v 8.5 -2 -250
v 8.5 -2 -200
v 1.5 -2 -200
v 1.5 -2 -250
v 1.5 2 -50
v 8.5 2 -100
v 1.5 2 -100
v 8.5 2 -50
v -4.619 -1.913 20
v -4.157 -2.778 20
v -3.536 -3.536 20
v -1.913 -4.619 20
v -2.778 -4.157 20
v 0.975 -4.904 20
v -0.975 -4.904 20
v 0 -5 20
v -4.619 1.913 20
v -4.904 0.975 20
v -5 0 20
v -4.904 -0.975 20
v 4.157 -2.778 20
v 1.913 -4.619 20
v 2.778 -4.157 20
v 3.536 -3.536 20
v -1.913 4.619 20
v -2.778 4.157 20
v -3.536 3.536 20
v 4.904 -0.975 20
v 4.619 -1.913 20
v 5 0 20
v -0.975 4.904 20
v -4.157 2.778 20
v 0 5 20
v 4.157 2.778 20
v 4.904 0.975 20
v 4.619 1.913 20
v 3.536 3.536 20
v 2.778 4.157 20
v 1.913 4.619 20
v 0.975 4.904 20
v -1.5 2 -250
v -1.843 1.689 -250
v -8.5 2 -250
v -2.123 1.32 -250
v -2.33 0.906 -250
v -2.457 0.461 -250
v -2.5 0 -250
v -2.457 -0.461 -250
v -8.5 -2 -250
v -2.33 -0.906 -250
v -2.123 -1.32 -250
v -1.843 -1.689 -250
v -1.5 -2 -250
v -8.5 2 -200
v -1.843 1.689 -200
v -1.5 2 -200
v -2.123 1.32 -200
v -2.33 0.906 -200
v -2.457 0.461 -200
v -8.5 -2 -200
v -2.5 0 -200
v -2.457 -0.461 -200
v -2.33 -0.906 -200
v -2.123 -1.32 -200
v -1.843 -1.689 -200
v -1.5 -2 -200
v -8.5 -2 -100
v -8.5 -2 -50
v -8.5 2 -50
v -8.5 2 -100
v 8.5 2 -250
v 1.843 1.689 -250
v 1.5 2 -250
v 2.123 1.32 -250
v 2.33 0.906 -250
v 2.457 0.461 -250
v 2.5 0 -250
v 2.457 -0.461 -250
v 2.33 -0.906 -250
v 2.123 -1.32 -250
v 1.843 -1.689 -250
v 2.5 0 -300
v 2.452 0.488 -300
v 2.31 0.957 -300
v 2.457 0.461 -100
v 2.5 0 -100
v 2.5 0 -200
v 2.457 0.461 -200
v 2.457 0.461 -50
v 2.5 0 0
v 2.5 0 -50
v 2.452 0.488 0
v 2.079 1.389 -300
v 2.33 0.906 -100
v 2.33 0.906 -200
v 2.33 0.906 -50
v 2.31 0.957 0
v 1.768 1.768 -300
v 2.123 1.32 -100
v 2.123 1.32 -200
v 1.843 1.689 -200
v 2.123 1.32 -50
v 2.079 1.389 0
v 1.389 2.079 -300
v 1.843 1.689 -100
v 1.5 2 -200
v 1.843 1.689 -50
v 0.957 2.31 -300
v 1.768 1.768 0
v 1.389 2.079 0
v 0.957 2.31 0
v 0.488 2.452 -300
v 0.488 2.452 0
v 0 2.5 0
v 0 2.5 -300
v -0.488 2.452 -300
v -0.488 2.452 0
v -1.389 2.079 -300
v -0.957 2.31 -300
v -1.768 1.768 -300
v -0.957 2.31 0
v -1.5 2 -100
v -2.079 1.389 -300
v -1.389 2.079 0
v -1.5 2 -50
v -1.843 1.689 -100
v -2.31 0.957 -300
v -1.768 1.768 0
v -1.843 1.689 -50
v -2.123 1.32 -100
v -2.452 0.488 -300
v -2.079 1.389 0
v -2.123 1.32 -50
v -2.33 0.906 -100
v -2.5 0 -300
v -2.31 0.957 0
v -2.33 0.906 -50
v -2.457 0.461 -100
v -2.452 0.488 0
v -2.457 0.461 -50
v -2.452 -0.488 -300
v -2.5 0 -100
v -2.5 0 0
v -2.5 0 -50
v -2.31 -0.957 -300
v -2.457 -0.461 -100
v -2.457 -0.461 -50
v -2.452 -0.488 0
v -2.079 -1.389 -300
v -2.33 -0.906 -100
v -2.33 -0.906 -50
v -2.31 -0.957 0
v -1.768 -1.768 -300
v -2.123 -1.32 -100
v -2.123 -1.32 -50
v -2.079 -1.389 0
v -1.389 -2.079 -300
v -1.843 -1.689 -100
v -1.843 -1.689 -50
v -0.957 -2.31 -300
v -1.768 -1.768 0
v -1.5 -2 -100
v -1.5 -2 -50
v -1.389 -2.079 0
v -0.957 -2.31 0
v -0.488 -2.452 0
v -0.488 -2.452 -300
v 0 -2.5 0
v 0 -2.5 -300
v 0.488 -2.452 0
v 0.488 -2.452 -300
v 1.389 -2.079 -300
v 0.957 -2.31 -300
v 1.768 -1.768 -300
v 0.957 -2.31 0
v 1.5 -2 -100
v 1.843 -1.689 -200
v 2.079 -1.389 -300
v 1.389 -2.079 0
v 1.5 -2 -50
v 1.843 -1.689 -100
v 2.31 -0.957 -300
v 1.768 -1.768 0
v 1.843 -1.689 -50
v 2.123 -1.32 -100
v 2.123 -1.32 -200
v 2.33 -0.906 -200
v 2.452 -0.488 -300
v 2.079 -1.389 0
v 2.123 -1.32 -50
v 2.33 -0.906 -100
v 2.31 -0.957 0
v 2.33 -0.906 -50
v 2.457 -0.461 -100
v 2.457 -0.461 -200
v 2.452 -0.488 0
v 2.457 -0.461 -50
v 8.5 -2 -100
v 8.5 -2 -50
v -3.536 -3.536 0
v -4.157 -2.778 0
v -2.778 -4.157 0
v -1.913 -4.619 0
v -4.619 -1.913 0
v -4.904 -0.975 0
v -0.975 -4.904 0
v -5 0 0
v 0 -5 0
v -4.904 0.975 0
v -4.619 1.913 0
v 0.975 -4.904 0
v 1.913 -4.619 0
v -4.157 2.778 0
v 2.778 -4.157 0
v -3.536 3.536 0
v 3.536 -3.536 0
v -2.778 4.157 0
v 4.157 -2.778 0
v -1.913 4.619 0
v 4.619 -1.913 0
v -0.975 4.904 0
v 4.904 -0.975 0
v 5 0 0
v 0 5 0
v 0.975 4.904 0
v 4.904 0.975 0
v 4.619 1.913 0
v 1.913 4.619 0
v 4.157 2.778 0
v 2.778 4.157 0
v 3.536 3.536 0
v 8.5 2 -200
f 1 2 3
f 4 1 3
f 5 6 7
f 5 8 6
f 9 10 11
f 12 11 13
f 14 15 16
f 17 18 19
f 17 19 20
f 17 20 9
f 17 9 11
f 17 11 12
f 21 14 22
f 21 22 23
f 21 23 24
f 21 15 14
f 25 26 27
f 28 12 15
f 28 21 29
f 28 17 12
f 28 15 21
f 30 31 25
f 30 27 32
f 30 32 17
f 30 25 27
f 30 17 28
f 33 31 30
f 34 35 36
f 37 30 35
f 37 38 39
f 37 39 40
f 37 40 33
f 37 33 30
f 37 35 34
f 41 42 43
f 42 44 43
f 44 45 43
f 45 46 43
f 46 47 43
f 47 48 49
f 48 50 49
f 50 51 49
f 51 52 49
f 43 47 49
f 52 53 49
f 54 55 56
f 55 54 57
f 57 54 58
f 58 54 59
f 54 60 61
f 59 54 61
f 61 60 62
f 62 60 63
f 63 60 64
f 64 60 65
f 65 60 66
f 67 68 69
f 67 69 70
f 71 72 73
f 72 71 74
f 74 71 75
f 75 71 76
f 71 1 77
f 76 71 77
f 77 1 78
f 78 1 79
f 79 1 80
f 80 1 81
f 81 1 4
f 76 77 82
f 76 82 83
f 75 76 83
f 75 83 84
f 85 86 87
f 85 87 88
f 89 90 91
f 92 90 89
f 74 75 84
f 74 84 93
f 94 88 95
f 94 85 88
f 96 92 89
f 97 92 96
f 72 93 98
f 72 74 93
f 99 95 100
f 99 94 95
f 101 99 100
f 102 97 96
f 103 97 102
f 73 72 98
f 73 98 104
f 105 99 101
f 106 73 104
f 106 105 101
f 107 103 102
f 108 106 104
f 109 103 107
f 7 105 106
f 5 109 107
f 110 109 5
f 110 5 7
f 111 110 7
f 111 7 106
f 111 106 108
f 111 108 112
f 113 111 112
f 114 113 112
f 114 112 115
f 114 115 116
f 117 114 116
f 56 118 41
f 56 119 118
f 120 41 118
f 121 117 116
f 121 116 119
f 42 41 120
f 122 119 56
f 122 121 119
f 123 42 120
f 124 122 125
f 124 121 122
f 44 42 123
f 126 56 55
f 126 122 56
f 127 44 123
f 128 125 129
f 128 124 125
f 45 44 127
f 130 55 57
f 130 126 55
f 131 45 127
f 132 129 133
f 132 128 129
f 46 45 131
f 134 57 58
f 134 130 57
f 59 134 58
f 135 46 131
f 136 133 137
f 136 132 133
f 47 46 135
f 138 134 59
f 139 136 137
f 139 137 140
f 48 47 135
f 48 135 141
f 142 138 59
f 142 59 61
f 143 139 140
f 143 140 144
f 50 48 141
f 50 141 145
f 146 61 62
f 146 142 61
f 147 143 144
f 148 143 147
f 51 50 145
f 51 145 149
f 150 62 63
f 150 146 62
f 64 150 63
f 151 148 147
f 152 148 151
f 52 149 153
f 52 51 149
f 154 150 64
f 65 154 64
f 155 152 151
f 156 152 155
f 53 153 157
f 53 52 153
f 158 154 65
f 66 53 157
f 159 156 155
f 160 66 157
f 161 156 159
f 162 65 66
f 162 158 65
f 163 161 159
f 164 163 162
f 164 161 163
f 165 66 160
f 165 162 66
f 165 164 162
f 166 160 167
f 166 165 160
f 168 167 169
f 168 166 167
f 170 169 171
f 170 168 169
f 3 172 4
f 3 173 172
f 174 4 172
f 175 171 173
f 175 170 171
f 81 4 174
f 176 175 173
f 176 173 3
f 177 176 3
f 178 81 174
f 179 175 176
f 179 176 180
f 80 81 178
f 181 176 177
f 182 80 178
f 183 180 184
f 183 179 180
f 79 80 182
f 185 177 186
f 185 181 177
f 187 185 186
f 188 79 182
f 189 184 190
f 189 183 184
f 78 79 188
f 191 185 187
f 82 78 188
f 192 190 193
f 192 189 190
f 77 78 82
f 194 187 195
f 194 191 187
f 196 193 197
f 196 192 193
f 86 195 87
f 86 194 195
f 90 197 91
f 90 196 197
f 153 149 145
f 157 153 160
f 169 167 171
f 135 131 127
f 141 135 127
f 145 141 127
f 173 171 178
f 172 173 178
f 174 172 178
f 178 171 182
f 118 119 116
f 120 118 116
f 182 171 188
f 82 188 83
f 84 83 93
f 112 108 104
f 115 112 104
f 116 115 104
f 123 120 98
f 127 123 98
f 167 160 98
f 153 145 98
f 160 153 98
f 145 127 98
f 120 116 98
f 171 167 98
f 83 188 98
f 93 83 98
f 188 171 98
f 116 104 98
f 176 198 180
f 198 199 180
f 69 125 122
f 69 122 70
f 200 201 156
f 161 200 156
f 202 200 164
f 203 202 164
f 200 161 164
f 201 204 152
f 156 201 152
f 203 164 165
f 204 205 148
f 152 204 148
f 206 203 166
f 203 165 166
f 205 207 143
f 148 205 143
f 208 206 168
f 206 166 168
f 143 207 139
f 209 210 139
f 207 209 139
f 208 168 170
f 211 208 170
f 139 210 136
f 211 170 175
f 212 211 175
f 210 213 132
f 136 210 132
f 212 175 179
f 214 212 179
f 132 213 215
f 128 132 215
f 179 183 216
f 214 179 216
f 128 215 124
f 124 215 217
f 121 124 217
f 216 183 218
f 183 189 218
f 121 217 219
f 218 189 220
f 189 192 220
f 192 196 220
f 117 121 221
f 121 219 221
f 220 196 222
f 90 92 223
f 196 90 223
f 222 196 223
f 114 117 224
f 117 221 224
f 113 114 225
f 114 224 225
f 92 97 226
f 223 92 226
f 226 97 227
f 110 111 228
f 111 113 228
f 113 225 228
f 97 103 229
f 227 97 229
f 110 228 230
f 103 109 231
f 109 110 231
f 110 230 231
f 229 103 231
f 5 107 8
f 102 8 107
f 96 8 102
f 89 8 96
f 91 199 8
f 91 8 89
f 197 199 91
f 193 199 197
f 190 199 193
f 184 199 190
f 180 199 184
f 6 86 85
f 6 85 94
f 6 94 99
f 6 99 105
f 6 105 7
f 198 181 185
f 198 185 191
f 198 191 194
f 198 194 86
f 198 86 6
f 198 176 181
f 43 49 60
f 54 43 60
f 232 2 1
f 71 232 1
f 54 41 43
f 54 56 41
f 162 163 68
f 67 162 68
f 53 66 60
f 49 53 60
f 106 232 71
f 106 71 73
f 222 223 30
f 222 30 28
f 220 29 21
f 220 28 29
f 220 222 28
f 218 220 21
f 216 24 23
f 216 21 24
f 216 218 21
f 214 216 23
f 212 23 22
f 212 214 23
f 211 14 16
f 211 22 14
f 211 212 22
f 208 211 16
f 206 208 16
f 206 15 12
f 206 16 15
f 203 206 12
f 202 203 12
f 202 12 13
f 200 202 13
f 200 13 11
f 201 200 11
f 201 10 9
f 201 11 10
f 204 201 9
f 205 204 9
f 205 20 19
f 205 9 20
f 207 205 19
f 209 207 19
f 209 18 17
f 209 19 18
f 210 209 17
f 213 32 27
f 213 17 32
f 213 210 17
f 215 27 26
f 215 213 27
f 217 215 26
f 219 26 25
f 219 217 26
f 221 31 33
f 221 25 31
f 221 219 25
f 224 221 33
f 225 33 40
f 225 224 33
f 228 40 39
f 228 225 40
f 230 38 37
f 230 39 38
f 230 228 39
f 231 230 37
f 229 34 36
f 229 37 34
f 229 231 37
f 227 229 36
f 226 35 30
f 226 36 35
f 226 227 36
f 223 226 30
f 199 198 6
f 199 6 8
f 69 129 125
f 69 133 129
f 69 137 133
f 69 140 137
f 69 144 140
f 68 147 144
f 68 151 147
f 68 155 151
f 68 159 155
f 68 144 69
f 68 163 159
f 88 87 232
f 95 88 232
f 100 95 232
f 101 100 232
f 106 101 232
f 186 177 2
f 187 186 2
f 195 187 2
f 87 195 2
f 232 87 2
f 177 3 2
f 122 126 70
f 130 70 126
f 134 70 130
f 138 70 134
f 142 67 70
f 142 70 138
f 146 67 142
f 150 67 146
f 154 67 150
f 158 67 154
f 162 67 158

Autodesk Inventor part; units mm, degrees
ref_plane "YZ Plane" through (0, 0, 0) normal (1, 0, 0) x (0, 1, 0)
ref_plane "XZ Plane" through (0, 0, 0) normal (0, 1, 0) x (-1, 0, 0)
ref_plane "XY Plane" through (0, 0, 0) normal (0, 0, 1) x (1, 0, 0)
sketch "Sketch1" plane through (0, 0, 0) normal (0, 0, 1) x (1, 0, 0)
  circle A0 centre (0, 0) radius 2.5
  dimension "d0" = 5
extrude "Extrusion1" add sketch "Sketch1" against normal blind 300
sketch "Sketch2" plane through (0, 0, 0) normal (0, 1, 0) x (-1, 0, 0)
  line L0 (1.5, -50) -> (8.5, -50)
  line L1 (8.5, -50) -> (8.5, -100)
  line L2 (8.5, -100) -> (1.5, -100)
  line L3 (1.5, -100) -> (1.5, -50)
  line L4 (1.5, -250) -> (8.5, -250)
  line L5 (8.5, -250) -> (8.5, -200)
  line L6 (8.5, -200) -> (1.5, -200)
  line L7 (1.5, -200) -> (1.5, -250)
  point P0 (0, 0)
  dimension "d3" = 7
  dimension "d4" = 50
  dimension "d5" = 7
  dimension "d6" = 50
  dimension "d7" = 0
  dimension "d8" = 150
  dimension "d9" = 8.5
  dimension "d10" = 50
extrude "Extrusion2" add sketch "Sketch2" along normal mid plane 4
mirror "Mirror1" about plane through (0, 0, 0) normal (1, 0, 0) of "Extrusion2"
sketch "Sketch3" plane through (0, 0, 0) normal (0, 0, 1) x (1, 0, 0)
  circle A0 centre (0, 0) radius 5
  dimension "d13" = 10
extrude "Extrusion3" add sketch "Sketch3" along normal blind 20
properties part number "Rod"
